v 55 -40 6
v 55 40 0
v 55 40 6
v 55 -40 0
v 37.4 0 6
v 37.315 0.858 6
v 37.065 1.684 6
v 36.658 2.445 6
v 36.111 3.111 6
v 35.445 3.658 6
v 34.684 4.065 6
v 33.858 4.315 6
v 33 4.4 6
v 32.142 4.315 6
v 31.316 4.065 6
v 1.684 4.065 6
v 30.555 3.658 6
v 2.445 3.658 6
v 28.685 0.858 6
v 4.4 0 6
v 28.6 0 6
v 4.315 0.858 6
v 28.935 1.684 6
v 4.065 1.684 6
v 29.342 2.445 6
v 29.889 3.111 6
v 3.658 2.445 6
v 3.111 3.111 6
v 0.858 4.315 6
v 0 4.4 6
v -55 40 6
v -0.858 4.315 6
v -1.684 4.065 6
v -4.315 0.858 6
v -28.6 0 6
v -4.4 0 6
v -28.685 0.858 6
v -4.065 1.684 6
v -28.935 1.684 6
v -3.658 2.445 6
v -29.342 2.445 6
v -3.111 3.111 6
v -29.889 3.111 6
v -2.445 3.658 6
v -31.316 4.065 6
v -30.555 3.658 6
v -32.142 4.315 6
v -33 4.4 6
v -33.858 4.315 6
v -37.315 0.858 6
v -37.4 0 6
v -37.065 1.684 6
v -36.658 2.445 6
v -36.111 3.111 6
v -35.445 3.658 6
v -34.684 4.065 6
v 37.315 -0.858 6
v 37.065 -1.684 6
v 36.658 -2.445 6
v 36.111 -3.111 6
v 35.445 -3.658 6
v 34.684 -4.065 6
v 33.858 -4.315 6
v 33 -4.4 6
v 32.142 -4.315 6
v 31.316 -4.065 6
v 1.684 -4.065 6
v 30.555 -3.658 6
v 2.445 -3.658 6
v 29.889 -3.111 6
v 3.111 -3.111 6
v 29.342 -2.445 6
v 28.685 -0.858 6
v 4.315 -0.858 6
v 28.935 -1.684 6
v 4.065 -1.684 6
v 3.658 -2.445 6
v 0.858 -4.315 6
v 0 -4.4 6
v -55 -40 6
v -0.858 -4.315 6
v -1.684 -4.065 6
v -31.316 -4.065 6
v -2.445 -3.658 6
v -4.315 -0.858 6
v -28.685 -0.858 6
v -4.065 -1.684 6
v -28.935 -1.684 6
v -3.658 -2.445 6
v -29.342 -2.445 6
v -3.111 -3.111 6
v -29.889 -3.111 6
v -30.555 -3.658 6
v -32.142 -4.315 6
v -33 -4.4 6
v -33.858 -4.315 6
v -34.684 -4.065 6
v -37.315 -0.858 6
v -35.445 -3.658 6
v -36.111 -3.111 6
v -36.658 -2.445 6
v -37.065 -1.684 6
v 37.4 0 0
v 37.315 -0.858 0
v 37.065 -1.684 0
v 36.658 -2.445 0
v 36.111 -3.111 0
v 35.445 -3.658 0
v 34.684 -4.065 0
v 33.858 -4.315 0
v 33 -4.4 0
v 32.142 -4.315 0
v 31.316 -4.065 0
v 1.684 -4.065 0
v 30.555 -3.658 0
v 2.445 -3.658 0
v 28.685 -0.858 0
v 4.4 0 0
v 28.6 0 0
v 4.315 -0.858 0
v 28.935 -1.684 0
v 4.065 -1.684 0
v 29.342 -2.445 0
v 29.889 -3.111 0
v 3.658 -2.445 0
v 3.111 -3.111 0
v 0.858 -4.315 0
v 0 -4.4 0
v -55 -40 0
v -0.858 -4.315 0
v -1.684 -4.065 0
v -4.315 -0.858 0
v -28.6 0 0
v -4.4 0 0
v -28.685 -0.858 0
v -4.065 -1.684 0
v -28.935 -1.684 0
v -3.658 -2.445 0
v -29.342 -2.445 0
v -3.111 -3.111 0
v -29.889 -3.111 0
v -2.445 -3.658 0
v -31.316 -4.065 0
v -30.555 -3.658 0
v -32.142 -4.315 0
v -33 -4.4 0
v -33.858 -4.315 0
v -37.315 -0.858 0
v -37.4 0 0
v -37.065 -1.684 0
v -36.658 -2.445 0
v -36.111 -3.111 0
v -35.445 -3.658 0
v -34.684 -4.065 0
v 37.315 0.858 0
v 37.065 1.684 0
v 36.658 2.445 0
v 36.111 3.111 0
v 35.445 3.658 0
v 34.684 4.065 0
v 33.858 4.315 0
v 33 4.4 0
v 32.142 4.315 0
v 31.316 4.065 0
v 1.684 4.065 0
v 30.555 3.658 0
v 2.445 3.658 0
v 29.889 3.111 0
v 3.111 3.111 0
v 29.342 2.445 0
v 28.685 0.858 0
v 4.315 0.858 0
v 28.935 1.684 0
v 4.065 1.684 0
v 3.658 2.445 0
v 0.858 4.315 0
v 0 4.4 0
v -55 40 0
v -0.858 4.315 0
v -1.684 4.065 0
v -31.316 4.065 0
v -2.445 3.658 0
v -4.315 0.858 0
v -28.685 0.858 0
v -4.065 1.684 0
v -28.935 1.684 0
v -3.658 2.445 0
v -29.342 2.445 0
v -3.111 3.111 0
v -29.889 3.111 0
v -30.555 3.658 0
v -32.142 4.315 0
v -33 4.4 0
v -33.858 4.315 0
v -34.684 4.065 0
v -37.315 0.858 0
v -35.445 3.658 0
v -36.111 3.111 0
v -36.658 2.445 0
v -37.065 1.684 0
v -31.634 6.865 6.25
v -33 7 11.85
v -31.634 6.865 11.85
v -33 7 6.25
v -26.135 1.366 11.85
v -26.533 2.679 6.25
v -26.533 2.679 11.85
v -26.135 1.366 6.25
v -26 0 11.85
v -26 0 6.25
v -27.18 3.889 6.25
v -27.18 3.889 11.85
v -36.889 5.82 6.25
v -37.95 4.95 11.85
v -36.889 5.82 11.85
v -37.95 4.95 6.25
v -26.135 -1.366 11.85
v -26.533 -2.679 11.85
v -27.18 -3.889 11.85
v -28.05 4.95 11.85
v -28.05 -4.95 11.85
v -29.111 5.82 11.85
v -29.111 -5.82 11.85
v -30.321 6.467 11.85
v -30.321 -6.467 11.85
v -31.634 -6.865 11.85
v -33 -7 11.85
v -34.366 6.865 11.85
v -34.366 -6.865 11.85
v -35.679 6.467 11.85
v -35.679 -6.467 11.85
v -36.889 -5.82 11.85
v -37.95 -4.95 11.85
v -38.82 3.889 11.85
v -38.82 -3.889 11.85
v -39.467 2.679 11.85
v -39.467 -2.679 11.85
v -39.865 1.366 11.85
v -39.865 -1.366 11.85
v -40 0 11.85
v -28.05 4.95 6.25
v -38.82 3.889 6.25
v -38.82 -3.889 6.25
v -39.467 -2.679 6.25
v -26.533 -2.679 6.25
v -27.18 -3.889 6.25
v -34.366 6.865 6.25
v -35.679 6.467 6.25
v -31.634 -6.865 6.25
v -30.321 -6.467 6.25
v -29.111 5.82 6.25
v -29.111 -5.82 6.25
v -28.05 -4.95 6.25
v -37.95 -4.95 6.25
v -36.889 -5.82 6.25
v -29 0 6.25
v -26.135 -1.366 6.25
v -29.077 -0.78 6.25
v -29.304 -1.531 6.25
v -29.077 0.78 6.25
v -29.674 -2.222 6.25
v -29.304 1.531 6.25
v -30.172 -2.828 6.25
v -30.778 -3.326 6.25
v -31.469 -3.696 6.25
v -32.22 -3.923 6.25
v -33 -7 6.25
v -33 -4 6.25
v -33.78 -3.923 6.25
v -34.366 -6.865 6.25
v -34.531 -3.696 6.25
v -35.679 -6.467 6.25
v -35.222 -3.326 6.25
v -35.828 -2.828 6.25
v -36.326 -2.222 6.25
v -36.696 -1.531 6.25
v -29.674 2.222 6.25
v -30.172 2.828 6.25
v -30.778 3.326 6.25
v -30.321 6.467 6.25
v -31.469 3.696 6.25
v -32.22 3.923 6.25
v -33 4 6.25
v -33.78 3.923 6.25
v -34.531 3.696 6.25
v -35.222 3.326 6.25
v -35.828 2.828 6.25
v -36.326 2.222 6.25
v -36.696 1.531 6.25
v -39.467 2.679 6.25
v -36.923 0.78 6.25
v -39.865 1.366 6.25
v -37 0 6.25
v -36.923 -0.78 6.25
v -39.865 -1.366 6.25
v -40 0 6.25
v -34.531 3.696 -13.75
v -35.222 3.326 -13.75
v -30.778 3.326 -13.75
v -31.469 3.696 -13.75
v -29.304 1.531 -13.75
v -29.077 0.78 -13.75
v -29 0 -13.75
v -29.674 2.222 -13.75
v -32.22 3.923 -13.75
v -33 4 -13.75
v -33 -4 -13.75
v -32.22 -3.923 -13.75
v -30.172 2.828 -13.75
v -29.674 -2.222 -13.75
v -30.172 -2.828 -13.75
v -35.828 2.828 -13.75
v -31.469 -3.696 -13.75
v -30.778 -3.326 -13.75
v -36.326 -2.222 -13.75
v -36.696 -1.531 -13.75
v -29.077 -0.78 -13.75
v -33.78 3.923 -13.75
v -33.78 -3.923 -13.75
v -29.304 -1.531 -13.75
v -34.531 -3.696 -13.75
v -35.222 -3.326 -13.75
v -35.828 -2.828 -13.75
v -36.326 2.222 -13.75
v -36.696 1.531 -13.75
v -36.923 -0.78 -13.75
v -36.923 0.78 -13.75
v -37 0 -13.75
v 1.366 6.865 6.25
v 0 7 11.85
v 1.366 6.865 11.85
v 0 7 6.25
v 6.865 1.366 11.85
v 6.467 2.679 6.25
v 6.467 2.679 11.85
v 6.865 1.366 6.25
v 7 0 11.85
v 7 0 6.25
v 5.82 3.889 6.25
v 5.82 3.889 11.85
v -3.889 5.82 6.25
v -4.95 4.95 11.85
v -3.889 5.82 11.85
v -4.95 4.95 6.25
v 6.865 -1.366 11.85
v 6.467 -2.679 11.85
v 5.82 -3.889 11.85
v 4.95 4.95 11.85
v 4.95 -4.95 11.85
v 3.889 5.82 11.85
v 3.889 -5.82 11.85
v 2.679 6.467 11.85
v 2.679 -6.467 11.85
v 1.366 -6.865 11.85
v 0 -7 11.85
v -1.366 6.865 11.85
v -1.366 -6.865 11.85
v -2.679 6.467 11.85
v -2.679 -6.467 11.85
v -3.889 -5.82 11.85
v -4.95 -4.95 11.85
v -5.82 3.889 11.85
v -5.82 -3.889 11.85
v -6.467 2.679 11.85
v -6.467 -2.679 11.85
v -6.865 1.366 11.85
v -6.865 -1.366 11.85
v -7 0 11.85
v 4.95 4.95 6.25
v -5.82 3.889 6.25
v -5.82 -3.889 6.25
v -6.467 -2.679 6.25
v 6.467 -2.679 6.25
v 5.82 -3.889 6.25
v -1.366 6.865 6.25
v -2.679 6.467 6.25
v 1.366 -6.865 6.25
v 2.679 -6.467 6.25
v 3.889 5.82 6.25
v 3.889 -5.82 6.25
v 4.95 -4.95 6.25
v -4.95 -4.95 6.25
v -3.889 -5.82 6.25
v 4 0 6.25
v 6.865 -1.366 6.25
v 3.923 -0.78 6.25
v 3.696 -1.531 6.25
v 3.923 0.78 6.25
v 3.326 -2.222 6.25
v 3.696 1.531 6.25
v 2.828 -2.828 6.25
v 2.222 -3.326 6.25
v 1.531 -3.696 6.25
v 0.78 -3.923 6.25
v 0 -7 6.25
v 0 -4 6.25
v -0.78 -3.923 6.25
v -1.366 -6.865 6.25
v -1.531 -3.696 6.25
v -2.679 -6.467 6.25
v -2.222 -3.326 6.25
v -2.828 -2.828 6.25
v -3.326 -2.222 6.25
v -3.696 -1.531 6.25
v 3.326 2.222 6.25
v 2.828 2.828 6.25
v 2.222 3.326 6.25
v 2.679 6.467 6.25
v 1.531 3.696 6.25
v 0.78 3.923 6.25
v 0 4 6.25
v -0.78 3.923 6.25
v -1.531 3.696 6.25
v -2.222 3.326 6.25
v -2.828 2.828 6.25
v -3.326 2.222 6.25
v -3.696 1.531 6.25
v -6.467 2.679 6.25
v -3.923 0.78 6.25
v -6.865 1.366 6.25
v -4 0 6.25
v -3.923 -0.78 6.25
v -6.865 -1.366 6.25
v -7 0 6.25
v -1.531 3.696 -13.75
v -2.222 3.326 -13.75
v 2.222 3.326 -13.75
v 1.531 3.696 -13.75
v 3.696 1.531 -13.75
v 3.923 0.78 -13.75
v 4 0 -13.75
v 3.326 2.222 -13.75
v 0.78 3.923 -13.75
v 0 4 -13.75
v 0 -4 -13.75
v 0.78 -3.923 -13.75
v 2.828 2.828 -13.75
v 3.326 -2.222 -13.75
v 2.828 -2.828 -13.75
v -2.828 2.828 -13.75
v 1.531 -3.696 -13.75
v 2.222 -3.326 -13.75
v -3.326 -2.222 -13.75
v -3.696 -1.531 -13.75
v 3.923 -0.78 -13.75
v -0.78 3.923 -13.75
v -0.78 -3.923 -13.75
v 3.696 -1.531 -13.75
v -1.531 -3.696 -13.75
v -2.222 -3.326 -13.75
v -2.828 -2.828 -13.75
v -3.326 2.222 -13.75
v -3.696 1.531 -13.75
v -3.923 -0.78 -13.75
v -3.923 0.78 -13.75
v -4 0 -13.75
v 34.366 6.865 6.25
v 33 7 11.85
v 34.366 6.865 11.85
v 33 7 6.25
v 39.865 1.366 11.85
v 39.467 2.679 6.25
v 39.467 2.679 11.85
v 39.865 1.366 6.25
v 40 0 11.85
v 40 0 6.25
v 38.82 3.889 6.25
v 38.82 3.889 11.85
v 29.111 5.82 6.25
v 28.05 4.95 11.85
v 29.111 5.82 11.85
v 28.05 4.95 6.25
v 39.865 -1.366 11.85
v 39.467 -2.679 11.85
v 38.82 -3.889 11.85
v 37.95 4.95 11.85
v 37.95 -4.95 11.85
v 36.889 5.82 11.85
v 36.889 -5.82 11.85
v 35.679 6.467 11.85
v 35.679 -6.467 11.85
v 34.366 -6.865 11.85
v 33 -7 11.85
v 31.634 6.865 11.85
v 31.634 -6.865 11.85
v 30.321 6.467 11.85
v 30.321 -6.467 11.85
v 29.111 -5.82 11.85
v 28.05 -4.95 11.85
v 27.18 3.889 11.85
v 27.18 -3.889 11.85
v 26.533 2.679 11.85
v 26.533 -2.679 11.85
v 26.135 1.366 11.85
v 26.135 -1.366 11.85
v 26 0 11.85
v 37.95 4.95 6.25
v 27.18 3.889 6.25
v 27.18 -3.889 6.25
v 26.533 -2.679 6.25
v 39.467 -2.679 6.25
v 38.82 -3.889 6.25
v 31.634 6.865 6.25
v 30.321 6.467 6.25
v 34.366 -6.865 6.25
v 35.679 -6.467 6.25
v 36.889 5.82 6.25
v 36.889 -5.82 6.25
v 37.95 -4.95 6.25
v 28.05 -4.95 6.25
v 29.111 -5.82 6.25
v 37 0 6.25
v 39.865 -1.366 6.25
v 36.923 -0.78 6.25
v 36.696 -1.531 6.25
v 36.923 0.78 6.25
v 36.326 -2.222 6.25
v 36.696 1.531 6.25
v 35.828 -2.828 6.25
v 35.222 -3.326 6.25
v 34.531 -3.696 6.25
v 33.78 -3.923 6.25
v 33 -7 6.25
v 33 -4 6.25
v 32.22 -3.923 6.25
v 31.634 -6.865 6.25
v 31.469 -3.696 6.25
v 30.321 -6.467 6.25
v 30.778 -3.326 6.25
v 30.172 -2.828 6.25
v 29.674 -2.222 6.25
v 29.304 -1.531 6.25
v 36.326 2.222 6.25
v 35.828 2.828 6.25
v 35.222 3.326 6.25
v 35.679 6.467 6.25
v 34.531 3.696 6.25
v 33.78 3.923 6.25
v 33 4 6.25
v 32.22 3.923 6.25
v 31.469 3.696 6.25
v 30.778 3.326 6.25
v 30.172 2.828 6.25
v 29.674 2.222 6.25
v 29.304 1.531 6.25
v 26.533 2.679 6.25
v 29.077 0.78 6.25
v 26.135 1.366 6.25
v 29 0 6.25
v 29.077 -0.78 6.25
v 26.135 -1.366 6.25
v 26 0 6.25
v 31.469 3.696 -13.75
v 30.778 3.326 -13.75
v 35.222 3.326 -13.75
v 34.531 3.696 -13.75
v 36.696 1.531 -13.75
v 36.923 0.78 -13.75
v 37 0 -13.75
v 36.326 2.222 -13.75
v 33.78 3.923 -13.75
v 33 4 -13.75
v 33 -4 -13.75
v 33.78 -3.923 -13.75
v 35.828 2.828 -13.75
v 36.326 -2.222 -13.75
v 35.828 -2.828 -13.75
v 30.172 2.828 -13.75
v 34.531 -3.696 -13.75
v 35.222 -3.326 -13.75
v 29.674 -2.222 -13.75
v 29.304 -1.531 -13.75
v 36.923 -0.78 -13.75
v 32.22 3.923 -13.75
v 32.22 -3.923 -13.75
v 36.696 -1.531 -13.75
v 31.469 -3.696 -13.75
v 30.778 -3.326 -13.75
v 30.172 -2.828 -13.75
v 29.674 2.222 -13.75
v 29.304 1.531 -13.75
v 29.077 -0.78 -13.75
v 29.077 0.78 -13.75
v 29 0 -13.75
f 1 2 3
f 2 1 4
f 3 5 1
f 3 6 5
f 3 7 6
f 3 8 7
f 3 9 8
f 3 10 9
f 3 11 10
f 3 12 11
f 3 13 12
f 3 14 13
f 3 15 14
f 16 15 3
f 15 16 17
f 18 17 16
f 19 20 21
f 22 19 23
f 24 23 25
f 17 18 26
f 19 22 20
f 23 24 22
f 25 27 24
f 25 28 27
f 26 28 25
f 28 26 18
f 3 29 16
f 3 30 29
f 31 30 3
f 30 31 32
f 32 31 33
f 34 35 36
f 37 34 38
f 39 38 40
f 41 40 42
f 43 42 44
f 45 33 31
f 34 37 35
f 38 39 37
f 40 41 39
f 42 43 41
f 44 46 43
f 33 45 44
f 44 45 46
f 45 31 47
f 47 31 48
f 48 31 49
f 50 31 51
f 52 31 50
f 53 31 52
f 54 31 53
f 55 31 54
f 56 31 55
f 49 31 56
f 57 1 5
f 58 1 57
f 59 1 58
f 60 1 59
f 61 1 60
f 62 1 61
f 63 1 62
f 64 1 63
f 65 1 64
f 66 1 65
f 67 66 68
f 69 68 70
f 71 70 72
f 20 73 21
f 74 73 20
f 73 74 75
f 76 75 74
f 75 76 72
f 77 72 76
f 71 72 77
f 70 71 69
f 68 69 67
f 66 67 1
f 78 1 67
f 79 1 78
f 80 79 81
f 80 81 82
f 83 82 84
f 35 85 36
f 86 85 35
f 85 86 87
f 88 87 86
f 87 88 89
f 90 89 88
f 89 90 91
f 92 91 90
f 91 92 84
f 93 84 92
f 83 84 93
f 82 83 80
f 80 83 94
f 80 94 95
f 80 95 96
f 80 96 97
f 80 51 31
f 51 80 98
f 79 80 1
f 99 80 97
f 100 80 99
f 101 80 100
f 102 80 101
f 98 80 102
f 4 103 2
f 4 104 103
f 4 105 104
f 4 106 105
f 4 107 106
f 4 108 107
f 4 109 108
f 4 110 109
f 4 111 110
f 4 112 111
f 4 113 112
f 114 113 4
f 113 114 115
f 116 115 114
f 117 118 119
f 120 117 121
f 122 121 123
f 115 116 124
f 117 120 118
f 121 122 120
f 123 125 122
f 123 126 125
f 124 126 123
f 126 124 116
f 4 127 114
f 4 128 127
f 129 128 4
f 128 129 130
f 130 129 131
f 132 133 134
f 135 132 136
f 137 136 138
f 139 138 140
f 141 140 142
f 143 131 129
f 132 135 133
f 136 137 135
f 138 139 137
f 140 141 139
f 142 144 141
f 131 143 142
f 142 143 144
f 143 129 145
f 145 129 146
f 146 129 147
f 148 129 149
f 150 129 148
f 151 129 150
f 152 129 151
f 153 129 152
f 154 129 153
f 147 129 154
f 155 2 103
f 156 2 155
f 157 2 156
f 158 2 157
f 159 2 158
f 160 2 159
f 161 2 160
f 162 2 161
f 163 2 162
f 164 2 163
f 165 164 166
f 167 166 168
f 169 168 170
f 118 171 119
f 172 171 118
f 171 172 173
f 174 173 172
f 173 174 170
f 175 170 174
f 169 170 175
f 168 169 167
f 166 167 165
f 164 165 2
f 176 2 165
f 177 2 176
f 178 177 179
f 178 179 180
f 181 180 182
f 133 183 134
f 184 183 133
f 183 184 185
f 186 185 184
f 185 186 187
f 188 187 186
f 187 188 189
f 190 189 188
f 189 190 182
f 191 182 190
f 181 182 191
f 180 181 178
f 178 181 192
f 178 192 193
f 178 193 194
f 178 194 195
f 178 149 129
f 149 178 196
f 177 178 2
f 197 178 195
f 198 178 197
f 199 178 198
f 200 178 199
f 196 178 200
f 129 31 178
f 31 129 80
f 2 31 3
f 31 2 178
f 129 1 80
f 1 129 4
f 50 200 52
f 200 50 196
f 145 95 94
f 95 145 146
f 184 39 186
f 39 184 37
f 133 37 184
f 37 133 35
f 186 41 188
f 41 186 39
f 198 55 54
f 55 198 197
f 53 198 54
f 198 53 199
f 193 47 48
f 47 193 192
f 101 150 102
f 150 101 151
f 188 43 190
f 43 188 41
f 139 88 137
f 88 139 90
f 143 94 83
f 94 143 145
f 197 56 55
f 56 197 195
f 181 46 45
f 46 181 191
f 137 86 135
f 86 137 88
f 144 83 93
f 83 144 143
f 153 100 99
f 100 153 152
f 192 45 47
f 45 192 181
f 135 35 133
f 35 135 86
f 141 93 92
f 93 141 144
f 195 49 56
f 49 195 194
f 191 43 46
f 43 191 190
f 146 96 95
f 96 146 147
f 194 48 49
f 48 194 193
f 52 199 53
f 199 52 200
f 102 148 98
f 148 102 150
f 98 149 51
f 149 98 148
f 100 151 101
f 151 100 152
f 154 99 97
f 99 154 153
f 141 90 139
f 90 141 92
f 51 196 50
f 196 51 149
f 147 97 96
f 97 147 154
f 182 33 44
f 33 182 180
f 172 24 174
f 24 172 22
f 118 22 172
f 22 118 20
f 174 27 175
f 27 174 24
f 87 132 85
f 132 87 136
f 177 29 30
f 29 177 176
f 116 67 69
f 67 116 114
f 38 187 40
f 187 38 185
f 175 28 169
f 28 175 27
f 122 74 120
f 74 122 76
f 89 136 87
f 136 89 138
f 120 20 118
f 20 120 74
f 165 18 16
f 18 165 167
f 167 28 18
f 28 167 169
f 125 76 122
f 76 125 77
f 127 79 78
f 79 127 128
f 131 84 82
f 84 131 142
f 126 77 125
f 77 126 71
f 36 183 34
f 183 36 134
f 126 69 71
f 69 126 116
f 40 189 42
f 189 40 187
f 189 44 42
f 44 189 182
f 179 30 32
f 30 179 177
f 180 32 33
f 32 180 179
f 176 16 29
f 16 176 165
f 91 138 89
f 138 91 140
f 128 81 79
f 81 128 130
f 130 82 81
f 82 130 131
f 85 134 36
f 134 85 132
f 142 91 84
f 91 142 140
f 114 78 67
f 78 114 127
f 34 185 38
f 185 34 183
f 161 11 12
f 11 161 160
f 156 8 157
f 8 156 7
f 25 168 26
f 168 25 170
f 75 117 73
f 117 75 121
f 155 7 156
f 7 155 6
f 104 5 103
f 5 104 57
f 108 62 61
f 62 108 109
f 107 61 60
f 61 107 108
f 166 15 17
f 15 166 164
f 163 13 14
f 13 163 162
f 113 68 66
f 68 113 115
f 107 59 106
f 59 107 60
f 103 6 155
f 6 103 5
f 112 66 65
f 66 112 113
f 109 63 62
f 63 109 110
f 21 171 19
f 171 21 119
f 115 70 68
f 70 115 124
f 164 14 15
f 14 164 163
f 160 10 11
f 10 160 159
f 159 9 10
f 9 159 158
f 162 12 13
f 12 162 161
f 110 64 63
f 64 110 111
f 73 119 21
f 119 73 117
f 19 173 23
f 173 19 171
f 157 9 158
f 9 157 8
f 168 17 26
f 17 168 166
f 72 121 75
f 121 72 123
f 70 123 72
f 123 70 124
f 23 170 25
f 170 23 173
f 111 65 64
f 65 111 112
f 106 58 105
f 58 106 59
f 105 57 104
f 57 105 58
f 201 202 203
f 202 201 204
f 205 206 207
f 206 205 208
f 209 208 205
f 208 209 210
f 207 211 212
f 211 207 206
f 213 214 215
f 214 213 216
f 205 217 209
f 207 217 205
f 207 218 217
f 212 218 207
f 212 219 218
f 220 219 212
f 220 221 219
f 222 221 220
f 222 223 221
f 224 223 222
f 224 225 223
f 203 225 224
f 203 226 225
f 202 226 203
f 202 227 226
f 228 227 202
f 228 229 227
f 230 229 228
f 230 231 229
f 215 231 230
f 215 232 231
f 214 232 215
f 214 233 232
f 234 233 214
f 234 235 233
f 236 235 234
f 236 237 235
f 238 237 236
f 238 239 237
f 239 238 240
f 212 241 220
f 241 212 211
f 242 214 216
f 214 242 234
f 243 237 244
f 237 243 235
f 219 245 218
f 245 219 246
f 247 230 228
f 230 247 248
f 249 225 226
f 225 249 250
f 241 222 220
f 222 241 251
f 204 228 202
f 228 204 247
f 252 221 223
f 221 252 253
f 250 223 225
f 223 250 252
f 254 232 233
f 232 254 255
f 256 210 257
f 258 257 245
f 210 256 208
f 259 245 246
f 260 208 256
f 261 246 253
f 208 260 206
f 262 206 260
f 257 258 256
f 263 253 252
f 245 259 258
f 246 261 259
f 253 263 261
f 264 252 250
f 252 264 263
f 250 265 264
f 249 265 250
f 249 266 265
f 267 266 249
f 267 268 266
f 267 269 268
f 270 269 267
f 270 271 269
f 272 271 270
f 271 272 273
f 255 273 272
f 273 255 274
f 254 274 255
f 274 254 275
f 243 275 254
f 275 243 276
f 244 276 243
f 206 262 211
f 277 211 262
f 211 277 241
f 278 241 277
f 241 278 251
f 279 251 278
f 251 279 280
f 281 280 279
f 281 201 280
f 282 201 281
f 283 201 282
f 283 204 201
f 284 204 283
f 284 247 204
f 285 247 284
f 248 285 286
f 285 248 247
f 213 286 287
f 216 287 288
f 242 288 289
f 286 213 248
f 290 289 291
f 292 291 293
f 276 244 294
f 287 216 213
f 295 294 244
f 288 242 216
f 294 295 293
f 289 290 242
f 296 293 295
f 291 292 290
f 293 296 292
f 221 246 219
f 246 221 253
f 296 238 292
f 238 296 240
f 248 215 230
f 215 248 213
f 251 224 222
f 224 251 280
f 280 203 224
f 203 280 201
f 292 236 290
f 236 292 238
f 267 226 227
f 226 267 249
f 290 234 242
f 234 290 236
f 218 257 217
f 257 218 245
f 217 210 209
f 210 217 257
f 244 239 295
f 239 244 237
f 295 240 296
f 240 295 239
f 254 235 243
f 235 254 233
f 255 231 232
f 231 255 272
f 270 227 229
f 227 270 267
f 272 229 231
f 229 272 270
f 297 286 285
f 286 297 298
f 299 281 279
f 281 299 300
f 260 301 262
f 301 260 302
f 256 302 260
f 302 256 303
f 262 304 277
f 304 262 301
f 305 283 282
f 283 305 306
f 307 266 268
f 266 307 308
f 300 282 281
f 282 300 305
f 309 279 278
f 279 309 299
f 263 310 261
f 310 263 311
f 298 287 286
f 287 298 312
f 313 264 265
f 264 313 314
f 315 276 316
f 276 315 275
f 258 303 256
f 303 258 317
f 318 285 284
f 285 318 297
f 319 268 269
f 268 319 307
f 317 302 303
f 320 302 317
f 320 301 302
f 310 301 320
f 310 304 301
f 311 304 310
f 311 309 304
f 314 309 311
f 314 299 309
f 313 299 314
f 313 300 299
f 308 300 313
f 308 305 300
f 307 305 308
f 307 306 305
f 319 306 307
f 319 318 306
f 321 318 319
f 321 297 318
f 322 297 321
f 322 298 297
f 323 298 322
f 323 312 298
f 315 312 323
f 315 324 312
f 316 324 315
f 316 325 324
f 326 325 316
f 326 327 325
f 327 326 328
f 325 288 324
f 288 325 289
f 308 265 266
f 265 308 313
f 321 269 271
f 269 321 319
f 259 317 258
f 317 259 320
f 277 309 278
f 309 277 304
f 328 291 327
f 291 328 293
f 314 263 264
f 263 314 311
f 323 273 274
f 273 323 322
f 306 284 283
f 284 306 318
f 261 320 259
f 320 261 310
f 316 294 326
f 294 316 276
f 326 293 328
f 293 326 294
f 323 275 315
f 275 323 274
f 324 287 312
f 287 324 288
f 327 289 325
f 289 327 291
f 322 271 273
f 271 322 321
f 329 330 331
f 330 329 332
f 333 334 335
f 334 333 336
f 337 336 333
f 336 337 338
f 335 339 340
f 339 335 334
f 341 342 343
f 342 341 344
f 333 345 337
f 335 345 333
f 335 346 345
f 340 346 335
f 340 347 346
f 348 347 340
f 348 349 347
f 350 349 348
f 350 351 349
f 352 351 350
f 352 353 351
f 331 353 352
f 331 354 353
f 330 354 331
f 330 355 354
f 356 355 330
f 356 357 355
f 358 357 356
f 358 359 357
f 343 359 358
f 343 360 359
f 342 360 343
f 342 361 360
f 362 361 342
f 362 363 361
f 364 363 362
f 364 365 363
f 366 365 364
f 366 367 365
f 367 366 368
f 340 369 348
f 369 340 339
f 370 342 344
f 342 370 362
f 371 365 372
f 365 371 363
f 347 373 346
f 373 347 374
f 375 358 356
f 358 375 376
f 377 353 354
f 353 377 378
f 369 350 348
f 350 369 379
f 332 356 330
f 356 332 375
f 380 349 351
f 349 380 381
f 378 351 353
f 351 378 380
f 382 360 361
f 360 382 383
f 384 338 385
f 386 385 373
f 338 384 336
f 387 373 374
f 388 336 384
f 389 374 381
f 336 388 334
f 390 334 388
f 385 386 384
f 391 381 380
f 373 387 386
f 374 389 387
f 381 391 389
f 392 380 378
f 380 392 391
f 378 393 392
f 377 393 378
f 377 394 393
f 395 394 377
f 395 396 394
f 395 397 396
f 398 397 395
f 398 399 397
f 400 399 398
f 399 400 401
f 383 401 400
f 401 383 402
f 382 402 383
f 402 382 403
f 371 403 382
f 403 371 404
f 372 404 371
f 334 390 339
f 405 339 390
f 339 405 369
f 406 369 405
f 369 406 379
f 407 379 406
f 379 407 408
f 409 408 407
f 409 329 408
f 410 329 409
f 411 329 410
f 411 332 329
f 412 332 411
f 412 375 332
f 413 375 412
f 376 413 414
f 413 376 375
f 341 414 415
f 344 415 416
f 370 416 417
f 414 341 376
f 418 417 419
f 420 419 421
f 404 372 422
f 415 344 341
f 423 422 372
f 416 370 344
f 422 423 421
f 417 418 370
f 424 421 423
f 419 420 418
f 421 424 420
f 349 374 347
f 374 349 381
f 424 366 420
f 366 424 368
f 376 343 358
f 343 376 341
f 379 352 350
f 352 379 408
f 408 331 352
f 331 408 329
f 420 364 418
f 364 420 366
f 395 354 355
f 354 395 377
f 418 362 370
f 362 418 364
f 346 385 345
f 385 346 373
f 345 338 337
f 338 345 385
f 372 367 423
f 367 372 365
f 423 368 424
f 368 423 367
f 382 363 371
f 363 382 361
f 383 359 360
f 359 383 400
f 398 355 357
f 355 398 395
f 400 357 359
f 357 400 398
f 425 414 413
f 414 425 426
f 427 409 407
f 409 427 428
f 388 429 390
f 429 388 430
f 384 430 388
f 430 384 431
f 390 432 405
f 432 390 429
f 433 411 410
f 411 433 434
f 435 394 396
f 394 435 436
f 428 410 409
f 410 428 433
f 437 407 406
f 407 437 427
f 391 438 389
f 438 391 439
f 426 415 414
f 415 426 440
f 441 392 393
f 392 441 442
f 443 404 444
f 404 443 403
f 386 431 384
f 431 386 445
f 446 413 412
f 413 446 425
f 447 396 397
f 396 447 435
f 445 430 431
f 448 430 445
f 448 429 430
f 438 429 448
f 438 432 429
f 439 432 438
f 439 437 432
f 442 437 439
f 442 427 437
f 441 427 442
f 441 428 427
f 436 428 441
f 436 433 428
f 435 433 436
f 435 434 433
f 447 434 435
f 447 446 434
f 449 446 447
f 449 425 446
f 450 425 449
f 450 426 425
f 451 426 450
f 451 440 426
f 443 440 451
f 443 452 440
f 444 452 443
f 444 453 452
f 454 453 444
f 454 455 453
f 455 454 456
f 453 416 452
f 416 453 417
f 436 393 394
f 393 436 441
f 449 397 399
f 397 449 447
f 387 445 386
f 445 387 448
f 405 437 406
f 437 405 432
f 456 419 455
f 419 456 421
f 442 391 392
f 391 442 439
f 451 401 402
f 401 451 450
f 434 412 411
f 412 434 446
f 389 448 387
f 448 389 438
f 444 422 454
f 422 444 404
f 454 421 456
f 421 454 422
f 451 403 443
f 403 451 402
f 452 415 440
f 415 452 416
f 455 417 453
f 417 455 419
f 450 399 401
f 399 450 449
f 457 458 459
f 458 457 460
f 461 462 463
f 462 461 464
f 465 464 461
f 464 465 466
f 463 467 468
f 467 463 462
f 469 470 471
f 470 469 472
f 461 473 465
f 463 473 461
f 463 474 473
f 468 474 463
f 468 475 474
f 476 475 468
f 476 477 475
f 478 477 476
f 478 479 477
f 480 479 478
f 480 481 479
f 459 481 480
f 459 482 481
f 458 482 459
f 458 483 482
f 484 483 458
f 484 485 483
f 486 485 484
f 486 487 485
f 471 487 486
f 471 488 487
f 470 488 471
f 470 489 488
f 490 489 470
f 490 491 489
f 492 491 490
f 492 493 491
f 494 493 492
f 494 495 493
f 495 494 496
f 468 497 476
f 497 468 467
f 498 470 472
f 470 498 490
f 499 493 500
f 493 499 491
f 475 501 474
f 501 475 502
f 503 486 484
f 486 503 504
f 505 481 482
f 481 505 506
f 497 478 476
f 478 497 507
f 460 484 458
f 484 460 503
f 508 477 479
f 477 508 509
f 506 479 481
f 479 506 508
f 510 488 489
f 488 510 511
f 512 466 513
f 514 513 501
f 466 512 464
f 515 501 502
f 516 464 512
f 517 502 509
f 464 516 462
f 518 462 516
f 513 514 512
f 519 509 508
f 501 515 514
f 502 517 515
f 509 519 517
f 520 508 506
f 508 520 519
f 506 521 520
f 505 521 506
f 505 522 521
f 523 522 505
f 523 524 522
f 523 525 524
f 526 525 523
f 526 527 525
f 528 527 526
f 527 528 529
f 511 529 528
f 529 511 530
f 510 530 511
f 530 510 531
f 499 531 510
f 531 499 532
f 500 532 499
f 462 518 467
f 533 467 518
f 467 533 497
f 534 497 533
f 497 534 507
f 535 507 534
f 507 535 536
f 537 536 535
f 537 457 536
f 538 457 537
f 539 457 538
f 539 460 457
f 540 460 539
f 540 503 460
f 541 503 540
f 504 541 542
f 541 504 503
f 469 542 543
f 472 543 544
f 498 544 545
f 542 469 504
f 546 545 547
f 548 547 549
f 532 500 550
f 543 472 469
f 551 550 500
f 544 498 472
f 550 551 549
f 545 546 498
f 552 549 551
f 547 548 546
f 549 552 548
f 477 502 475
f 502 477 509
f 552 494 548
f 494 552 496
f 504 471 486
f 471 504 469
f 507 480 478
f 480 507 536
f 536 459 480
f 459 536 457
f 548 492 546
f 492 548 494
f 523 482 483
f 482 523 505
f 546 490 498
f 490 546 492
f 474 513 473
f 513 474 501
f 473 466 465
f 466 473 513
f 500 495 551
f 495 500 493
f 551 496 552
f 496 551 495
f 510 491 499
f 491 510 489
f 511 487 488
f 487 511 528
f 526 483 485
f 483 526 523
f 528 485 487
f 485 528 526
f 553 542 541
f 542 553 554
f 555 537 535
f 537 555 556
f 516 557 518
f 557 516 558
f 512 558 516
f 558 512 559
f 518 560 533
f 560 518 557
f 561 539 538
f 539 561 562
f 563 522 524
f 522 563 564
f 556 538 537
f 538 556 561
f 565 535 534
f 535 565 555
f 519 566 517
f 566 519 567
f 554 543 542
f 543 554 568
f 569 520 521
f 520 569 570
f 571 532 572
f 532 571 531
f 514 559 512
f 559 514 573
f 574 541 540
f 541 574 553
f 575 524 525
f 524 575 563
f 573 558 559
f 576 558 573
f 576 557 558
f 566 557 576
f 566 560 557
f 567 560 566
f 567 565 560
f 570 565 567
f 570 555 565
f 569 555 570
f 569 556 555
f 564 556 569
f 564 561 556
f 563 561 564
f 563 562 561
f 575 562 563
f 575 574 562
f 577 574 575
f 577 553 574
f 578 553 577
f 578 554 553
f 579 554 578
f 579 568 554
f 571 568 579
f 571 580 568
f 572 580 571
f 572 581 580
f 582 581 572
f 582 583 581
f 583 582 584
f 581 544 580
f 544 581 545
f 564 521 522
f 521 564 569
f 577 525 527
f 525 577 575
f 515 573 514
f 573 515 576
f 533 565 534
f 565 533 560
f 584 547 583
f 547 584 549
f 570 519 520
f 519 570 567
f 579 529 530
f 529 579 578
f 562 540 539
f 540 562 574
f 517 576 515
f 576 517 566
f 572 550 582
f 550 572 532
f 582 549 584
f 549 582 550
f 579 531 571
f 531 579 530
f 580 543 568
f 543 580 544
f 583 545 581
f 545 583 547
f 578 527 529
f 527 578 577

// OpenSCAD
$fn = 32;

// ------------------------------------------------------------------------
// Bolted plate: 110 x 80 x 6 mm plate, 3 fasteners
// Every part is its own module, assembly() places them once.
// ------------------------------------------------------------------------

// --- part 1 ---
module plate() {
  difference() {
    translate([-55, -40, 0]) cube([110, 80, 6]);
    translate([-33, 0, -1]) cylinder(h = 8, d = 8.8);
    translate([0, 0, -1]) cylinder(h = 8, d = 8.8);
    translate([33, 0, -1]) cylinder(h = 8, d = 8.8);
  }
}

// --- part 2 ---
module bolt1() {
  cylinder(h = 5.6, d = 14);
  translate([0, 0, -20]) cylinder(h = 20, d = 8);
}

// --- part 3 ---
module bolt2() {
  cylinder(h = 5.6, d = 14);
  translate([0, 0, -20]) cylinder(h = 20, d = 8);
}

// --- part 4 ---
module bolt3() {
  cylinder(h = 5.6, d = 14);
  translate([0, 0, -20]) cylinder(h = 20, d = 8);
}

// --- assembly ---
module assembly() {
  translate([0, 0, 0]) rotate([0, 0, 0]) plate();
  translate([-33, 0, 6.25]) rotate([0, 0, 0]) bolt1();
  translate([0, 0, 6.25]) rotate([0, 0, 0]) bolt2();
  translate([33, 0, 6.25]) rotate([0, 0, 0]) bolt3();
}

assembly();
